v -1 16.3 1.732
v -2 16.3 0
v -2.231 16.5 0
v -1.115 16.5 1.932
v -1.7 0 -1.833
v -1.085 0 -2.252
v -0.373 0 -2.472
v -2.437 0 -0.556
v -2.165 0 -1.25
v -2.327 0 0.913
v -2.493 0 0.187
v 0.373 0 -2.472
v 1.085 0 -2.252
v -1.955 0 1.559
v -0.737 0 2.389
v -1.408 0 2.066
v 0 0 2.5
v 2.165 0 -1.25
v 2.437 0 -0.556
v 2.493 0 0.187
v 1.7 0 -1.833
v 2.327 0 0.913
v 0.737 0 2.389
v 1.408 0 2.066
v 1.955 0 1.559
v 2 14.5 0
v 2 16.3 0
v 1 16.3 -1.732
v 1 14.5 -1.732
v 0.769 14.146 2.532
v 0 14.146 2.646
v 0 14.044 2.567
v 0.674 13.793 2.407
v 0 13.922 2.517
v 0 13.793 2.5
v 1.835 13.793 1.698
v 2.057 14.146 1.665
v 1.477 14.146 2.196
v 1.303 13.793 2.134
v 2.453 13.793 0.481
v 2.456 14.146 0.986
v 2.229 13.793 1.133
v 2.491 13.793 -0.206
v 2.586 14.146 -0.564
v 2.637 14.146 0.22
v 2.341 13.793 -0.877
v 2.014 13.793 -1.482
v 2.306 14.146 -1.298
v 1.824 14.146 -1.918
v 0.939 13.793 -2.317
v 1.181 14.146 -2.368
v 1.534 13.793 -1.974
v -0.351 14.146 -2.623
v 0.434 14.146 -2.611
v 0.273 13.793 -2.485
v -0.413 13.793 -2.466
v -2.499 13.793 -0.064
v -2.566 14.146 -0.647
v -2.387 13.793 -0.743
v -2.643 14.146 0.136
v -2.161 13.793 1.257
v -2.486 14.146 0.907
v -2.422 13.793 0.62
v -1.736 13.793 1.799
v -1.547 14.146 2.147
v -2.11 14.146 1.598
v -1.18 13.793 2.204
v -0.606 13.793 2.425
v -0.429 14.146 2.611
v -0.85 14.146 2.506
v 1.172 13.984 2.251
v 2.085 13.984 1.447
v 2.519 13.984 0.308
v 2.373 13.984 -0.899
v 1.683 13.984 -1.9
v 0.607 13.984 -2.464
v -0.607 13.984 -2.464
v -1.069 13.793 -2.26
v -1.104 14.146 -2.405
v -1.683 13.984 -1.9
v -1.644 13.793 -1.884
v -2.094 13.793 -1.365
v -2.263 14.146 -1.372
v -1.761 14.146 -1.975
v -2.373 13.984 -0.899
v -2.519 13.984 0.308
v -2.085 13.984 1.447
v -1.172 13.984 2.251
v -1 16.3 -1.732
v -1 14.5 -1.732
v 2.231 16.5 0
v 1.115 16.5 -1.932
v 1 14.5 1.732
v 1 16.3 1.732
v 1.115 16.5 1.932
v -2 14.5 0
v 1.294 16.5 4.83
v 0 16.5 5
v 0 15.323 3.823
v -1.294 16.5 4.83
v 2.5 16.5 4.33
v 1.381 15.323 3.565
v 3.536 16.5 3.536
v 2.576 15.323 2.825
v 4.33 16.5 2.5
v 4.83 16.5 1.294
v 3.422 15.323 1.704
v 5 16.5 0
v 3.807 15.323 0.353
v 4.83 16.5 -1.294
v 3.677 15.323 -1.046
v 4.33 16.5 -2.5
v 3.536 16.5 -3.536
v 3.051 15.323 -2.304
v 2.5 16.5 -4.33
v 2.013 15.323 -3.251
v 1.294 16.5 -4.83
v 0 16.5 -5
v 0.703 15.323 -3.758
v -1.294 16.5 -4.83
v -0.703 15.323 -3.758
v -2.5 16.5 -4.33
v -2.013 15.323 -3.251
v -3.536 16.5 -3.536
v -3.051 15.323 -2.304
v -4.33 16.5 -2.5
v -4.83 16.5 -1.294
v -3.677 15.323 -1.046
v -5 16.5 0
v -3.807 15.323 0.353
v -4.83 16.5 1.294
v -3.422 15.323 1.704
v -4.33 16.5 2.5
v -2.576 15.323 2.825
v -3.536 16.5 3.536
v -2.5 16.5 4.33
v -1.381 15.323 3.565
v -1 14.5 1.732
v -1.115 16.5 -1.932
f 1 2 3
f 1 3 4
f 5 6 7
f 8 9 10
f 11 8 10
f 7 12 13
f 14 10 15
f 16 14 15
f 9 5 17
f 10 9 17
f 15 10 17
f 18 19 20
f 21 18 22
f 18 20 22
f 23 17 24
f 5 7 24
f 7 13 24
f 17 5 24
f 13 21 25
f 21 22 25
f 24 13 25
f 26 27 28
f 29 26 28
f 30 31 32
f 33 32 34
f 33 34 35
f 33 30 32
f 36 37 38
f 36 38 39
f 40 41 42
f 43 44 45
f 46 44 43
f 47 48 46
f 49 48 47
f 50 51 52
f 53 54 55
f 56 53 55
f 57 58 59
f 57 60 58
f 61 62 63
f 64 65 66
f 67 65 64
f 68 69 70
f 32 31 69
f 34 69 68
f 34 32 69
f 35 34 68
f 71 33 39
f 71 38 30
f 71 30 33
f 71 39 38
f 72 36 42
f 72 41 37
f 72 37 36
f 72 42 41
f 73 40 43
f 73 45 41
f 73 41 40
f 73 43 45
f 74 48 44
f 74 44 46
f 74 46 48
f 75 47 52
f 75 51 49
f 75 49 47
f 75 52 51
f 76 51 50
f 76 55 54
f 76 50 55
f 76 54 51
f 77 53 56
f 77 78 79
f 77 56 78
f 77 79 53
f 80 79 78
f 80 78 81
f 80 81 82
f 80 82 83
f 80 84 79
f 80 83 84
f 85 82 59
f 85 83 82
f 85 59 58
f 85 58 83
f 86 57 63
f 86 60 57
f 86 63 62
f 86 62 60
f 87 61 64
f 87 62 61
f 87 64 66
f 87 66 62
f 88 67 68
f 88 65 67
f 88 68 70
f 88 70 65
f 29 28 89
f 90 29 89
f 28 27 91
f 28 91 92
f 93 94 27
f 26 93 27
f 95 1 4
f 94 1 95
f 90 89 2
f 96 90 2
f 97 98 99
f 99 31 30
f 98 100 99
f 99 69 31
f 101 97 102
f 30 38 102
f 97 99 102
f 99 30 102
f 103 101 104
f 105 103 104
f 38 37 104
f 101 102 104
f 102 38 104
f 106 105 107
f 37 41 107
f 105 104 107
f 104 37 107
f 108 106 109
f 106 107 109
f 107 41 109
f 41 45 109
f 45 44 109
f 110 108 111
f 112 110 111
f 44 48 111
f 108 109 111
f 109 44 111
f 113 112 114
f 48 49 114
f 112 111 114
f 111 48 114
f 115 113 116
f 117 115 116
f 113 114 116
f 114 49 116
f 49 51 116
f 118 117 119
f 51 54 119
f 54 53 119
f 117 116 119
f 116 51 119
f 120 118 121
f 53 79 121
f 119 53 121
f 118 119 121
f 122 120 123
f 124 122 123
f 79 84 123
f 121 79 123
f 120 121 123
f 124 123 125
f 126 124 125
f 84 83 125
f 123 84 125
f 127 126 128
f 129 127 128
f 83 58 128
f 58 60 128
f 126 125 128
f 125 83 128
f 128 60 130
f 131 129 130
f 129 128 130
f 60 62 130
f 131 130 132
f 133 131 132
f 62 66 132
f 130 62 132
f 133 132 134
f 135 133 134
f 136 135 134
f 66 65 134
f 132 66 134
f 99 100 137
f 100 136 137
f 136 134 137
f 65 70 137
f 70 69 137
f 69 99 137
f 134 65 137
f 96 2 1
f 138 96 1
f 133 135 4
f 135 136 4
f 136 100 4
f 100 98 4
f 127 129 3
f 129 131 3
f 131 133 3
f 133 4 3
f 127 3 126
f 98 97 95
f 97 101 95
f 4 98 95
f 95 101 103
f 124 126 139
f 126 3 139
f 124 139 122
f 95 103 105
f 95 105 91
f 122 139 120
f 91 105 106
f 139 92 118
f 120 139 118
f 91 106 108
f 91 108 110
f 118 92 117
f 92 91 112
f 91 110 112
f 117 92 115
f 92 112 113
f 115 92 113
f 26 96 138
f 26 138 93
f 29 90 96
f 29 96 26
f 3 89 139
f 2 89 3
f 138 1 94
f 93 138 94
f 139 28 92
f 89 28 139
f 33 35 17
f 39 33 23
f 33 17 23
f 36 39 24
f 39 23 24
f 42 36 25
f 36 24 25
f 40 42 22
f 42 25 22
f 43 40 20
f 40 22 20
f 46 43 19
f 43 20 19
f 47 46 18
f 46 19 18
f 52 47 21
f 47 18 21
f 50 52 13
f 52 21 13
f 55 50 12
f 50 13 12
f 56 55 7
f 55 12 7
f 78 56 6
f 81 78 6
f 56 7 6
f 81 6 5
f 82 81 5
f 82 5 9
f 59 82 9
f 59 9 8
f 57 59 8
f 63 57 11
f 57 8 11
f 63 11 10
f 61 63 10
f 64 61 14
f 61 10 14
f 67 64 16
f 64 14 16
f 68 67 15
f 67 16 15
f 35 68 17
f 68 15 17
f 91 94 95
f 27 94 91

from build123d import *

# Parameters (mm, degrees)
SKETCH1_R           = 2.5
BOSS_EXTRUDE1_DEPTH = 14
CUT_EXTRUDE1_DEPTH  = 2
CHAMFER1_SIZE       = 0.2
FILLET1_R           = 0.5


with BuildPart() as part:
    # Sketch1 → Boss-Extrude1 (new body)
    with BuildSketch(Plane(origin=(0, 0, 0), x_dir=(1, 0, 0), z_dir=(0, 1, 0))):
        with Locations(Location((0, 0, 0), (0, 0, 270))):
            Circle(SKETCH1_R)
    extrude(amount=BOSS_EXTRUDE1_DEPTH)

    # Sketch2 → Revolve1 (revolve)
    with BuildSketch(Plane.XY, mode=Mode.PRIVATE) as revolve1_sk:
        Polygon((-5, 16.5), (-2.5, 14), (0, 14), (0, 16.5), align=None)
    revolve(revolve1_sk.sketch.rotate(Axis((0, 14, 0), (0, 1, 0)), 90), axis=Axis((0, 14, 0), (0, 1, 0)))

    # Sketch3 → Cut-Extrude1 (cut)
    with BuildSketch(Plane(origin=(0, 16.5, 0), x_dir=(1, 0, 0), z_dir=(0, 1, 0))):
        Polygon((2, 0), (1, 1.732050808), (-1, 1.732050808), (-2, 0), (-1, -1.732050808), (1, -1.732050808), align=None)
    extrude(amount=-CUT_EXTRUDE1_DEPTH, mode=Mode.SUBTRACT)

    # Chamfer1
    chamfer1_edges = [part.edges().sort_by_distance(p)[0] for p in [
        (1.5, 16.5, 0.866025404),
        (1.5, 16.5, -0.866025404),
        (0, 16.5, -1.732050808),
        (-1.5, 16.5, -0.866025404),
        (-1.5, 16.5, 0.866025404),
        (0, 16.5, 1.732050808),
    ]]
    chamfer(chamfer1_edges, length=CHAMFER1_SIZE)

    # Fillet1
    fillet1_edges = [part.edges().sort_by_distance(p)[0] for p in [
        (0, 14, -2.5),
    ]]
    fillet(fillet1_edges, radius=FILLET1_R)


solid = part.part
